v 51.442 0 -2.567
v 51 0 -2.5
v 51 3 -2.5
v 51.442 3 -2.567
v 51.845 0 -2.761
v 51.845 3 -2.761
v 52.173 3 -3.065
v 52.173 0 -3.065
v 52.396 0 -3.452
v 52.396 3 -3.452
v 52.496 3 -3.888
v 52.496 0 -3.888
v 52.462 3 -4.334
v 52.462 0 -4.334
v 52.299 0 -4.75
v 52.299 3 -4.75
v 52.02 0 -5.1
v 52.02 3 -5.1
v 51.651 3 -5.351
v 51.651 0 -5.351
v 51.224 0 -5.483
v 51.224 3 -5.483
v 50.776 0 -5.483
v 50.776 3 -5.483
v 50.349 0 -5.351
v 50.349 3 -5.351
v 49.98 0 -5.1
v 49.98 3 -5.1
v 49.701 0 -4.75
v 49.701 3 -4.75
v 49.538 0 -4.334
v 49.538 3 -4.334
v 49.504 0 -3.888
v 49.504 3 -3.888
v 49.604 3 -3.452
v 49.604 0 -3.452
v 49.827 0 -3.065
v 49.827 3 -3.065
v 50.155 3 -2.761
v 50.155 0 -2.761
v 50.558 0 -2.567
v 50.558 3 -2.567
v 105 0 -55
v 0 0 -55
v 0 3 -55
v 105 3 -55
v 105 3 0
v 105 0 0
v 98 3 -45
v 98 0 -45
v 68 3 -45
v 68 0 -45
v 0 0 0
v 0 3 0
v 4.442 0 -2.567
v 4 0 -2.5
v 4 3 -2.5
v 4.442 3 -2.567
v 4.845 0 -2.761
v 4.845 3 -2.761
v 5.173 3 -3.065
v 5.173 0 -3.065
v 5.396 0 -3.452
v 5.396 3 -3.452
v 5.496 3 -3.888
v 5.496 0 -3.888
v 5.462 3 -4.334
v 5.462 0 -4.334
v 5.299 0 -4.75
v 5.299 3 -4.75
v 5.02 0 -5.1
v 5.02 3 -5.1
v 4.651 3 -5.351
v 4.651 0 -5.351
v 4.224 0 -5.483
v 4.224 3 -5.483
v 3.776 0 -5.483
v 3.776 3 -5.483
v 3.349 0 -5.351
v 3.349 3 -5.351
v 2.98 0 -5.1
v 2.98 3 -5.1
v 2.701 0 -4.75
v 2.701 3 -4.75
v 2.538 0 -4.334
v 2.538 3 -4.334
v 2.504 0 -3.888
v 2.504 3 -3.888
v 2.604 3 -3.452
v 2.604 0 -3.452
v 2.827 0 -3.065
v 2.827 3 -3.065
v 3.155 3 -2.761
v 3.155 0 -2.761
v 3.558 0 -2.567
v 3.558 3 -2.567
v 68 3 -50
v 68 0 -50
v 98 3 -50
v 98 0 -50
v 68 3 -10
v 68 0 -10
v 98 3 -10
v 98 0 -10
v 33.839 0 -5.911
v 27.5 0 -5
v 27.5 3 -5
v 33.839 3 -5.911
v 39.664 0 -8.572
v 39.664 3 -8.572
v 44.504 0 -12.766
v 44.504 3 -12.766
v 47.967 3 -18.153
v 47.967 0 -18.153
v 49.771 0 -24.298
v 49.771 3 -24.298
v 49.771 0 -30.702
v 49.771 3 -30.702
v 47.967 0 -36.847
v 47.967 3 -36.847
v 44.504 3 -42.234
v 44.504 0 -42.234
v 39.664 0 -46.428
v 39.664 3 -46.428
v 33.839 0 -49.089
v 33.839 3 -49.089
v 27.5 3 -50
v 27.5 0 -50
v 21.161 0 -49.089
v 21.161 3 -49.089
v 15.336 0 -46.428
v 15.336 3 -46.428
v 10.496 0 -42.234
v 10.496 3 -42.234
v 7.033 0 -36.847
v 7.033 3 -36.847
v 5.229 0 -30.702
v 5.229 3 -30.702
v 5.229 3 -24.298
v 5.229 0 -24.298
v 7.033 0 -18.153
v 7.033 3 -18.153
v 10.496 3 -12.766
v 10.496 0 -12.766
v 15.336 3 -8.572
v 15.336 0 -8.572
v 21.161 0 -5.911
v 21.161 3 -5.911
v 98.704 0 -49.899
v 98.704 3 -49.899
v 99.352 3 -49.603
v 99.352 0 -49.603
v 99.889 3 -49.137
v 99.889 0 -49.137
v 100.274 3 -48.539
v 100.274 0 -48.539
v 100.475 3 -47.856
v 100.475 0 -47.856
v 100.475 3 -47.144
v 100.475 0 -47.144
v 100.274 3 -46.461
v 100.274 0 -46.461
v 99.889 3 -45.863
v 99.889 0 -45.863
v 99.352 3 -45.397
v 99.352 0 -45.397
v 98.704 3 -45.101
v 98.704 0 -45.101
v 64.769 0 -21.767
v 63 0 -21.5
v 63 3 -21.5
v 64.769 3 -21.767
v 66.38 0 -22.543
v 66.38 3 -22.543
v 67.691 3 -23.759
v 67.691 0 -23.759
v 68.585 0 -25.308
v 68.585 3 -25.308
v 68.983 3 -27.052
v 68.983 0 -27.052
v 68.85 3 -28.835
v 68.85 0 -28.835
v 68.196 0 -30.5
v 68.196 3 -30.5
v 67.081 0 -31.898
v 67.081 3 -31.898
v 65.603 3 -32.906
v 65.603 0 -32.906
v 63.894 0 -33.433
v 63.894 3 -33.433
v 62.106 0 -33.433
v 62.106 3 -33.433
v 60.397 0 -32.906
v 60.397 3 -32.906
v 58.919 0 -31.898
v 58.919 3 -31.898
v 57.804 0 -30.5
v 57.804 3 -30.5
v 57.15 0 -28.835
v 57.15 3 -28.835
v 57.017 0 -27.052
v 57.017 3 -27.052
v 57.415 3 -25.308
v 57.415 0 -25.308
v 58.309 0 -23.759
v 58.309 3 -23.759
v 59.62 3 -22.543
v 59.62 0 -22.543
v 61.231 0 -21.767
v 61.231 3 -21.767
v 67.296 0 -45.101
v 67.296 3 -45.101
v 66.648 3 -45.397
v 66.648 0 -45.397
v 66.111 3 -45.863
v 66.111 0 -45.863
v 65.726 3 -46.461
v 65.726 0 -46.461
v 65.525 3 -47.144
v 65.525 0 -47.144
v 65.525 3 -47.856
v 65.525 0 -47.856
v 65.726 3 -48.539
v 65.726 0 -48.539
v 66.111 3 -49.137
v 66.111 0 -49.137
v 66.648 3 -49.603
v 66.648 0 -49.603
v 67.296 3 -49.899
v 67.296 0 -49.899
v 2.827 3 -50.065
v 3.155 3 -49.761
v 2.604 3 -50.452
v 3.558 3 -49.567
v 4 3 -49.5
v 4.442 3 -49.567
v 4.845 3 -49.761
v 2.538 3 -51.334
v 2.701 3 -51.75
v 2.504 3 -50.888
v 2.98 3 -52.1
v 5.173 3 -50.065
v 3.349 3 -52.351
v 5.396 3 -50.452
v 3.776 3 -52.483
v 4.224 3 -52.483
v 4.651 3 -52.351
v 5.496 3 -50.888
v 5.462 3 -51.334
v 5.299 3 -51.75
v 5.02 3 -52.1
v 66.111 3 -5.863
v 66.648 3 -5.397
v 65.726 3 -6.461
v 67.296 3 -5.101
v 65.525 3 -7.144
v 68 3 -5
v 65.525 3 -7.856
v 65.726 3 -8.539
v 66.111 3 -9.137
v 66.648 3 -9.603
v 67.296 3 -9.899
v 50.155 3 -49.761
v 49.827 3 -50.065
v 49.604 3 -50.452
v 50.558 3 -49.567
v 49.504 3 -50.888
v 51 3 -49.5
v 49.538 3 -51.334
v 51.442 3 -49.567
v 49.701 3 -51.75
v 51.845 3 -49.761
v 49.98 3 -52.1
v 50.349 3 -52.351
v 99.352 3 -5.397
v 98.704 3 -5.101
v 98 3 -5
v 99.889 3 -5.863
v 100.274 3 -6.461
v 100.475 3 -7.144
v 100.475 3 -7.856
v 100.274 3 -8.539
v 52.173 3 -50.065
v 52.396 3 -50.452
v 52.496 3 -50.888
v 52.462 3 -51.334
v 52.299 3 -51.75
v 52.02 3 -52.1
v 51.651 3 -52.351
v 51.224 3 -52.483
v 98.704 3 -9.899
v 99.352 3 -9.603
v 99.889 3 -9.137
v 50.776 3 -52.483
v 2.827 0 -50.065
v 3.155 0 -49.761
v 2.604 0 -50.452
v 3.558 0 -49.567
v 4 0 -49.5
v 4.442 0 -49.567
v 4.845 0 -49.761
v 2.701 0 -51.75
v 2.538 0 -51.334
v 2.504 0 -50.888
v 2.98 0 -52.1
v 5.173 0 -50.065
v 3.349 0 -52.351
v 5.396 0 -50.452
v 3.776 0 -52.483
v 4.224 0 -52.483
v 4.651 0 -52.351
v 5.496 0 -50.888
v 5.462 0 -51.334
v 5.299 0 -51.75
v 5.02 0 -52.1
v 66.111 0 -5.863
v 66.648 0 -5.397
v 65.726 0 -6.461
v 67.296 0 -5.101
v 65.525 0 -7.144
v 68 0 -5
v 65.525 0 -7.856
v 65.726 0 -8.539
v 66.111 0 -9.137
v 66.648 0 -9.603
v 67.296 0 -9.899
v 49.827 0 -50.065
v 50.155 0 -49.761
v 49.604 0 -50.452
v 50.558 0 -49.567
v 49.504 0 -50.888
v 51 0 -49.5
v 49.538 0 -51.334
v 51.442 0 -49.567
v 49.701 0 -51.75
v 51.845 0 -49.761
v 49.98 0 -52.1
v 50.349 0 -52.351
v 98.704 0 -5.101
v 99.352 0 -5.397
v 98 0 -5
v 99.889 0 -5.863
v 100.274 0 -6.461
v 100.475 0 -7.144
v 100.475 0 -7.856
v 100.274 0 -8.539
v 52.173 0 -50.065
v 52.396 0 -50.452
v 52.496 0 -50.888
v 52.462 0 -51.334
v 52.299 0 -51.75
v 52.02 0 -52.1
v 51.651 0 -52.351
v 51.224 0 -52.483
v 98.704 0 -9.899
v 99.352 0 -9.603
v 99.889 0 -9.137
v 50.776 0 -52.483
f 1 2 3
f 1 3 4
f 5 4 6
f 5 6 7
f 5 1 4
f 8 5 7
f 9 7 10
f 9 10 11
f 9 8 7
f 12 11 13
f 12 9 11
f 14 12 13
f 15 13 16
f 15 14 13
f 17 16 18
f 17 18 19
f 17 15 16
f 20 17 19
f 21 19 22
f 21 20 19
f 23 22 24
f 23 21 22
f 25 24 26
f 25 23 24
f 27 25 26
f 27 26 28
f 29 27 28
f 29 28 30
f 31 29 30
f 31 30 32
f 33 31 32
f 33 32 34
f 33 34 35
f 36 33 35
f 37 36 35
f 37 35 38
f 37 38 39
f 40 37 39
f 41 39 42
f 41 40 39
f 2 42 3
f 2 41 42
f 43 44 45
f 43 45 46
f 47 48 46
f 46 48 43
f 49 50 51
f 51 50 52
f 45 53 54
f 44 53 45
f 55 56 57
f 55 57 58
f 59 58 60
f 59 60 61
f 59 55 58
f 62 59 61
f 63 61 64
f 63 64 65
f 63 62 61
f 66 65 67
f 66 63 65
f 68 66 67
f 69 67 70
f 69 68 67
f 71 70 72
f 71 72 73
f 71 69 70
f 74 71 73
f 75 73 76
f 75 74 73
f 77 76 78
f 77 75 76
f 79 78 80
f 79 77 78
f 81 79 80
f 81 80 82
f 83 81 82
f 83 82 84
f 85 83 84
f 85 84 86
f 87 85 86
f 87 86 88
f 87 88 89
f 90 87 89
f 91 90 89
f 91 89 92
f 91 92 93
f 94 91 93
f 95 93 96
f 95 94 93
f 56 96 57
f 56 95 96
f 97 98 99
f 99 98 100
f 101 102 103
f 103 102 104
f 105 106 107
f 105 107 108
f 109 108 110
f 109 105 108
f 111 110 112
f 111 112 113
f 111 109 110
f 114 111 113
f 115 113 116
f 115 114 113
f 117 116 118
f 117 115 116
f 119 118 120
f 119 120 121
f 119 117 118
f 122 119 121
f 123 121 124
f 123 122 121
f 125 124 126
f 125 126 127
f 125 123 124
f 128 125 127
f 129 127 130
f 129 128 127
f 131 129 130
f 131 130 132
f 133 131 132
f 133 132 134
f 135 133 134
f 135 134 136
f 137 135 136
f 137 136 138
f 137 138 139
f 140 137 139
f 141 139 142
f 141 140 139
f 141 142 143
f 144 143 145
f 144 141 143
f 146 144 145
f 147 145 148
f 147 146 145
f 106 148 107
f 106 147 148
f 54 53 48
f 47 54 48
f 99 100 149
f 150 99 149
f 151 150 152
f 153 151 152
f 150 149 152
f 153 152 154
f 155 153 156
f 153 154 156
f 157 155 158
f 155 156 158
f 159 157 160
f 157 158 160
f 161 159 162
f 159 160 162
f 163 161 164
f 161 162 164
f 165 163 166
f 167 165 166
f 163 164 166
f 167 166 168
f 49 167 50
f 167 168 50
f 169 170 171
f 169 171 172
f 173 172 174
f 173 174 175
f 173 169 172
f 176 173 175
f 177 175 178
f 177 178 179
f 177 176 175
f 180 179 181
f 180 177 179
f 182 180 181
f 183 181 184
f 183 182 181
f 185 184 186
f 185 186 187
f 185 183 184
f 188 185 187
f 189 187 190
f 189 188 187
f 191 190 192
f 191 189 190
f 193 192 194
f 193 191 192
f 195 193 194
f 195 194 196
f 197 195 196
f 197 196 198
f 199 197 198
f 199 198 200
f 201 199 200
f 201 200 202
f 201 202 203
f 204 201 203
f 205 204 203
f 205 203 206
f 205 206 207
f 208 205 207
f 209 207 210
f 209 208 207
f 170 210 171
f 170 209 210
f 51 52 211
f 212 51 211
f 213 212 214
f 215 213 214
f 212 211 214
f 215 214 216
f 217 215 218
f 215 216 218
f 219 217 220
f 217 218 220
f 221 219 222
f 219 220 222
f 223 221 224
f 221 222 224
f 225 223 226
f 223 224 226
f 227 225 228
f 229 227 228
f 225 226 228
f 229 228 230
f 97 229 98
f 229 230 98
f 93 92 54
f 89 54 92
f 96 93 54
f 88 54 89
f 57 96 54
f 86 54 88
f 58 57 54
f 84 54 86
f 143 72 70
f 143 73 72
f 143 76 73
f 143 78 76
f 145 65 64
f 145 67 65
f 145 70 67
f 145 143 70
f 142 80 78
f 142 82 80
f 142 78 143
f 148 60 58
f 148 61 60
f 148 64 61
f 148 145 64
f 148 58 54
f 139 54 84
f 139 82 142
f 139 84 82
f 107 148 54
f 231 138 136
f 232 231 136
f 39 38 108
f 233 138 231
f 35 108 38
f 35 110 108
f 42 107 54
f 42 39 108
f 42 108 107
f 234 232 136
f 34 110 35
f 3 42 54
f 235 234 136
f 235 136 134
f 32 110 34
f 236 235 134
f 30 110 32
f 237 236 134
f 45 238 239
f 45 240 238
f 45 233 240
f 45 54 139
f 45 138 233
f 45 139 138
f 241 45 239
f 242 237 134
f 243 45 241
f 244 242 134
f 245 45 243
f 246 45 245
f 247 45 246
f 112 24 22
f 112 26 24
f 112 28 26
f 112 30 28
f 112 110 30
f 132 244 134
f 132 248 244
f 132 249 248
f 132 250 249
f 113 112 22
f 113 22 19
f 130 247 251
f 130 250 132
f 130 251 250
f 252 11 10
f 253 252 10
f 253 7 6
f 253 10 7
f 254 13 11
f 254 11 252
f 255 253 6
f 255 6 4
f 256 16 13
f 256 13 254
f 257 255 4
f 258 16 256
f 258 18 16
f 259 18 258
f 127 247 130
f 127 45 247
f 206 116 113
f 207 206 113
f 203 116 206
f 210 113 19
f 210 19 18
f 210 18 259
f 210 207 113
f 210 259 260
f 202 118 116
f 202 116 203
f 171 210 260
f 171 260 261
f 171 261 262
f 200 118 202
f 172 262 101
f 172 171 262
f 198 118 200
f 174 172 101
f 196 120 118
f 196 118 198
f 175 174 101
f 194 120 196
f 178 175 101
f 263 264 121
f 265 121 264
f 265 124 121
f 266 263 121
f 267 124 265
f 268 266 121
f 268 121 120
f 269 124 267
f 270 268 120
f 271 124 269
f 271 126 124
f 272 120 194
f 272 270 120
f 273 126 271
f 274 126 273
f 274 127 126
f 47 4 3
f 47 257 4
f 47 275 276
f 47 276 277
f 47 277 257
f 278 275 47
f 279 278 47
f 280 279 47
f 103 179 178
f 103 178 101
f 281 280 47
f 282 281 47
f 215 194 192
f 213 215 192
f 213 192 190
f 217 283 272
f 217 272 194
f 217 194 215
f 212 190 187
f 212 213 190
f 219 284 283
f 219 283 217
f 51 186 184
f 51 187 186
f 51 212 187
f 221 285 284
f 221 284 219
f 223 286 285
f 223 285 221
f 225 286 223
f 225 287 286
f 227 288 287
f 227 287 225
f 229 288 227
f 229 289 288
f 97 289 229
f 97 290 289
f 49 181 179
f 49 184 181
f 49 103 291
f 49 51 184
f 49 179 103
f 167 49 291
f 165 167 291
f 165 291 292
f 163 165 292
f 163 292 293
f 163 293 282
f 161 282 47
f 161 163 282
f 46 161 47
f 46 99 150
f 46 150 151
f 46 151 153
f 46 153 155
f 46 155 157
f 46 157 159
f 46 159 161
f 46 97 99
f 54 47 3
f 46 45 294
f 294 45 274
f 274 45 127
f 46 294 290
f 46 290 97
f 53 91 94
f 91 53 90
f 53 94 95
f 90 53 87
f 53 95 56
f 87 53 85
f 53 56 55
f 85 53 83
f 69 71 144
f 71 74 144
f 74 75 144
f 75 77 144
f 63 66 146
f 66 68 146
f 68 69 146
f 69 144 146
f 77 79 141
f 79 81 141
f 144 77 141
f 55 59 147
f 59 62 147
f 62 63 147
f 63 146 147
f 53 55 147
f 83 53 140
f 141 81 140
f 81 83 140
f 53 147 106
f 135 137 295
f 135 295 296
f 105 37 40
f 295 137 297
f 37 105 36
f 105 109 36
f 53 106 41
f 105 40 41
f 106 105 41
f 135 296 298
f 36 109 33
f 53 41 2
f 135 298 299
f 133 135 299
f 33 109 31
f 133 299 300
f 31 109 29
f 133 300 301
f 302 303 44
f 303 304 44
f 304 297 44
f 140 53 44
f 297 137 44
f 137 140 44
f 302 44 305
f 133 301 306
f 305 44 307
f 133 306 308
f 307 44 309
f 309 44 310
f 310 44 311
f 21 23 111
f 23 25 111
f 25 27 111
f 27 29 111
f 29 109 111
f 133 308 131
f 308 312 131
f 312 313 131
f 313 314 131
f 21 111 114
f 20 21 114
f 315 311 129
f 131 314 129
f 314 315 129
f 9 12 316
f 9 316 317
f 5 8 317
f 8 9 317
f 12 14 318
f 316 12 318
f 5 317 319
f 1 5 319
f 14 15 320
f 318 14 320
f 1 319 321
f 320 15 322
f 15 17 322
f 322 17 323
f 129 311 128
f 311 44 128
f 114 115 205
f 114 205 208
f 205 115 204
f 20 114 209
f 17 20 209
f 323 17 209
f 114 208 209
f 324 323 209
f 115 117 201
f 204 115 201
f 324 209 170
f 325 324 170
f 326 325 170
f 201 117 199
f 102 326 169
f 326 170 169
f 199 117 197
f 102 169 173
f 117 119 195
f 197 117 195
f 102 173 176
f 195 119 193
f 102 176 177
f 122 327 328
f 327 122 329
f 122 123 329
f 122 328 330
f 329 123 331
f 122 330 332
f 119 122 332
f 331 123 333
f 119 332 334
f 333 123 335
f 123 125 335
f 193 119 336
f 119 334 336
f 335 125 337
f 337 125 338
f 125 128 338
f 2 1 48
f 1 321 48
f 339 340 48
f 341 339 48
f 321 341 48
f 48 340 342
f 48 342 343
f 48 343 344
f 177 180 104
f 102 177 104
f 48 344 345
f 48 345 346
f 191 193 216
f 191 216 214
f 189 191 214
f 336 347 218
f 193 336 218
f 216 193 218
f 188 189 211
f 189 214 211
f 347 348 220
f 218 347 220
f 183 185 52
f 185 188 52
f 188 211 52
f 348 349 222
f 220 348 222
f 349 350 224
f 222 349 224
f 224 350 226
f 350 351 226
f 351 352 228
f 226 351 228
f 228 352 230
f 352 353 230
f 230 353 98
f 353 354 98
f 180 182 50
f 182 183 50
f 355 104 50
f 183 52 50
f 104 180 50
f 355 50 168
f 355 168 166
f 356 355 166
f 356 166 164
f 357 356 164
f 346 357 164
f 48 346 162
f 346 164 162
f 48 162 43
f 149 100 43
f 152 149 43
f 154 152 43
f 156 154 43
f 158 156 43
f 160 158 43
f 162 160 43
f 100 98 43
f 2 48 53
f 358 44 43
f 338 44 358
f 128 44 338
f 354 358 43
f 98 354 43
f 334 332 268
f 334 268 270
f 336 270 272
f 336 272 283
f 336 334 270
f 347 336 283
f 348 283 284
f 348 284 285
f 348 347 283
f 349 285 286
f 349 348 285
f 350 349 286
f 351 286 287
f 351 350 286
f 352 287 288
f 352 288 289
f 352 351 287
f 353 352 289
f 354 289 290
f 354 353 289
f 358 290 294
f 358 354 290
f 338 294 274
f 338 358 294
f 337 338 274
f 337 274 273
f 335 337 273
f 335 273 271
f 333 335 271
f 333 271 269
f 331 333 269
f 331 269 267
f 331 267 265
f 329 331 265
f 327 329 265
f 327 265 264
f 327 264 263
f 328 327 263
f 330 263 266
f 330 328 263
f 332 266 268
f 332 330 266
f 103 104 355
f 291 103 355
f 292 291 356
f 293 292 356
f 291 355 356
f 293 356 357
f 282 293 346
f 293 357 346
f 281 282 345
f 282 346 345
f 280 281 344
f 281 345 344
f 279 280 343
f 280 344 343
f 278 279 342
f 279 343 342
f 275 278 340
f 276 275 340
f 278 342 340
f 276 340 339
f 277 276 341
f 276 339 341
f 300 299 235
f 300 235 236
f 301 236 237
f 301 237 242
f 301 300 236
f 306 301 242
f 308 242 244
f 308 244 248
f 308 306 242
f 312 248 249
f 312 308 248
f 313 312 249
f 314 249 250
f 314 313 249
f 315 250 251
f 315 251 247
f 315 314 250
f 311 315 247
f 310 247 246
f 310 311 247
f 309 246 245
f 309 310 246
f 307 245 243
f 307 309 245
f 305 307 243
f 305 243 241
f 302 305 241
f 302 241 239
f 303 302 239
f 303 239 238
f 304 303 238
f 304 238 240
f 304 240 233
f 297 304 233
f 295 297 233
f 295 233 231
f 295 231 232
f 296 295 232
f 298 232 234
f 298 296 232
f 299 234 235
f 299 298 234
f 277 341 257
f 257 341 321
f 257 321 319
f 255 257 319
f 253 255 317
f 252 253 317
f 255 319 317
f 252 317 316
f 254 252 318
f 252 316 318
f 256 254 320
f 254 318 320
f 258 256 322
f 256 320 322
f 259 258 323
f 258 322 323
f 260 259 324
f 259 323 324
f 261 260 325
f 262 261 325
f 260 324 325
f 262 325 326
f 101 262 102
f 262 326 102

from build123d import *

# Parameters (mm, degrees)
SKETCH1_W           = 105
SKETCH1_H           = 55
SKETCH1_R           = 22.5
SKETCH1_R_2         = 6
SKETCH1_R_3         = 1.5
BOSS_EXTRUDE1_DEPTH = 3


with BuildPart() as part:
    # Sketch1 → Boss-Extrude1 (new body)
    with BuildSketch(Plane(origin=(0, 0, 0), x_dir=(1, 0, 0), z_dir=(0, 1, 0))):
        with Locations((52.5, 27.5)):
            Rectangle(SKETCH1_W, SKETCH1_H)
        with Locations((27.5, 27.5)):
            Circle(SKETCH1_R, mode=Mode.SUBTRACT)
        with Locations((63, 27.5)):
            Circle(SKETCH1_R_2, mode=Mode.SUBTRACT)
        with Locations((4, 4)):
            Circle(SKETCH1_R_3, mode=Mode.SUBTRACT)
        with Locations((51, 4)):
            Circle(SKETCH1_R_3, mode=Mode.SUBTRACT)
        with Locations((51, 51)):
            Circle(SKETCH1_R_3, mode=Mode.SUBTRACT)
        with Locations((4, 51)):
            Circle(SKETCH1_R_3, mode=Mode.SUBTRACT)
        with BuildLine():
            Line((98, 45), (68, 45))
            ThreePointArc((68, 45), (65.5, 47.5), (68, 50))
            Line((68, 50), (98, 50))
            ThreePointArc((98, 50), (100.5, 47.5), (98, 45))
        make_face(mode=Mode.SUBTRACT)
        with BuildLine():
            Line((98, 5), (68, 5))
            ThreePointArc((68, 5), (65.5, 7.5), (68, 10))
            Line((68, 10), (98, 10))
            ThreePointArc((98, 10), (100.5, 7.5), (98, 5))
        make_face(mode=Mode.SUBTRACT)
    extrude(amount=BOSS_EXTRUDE1_DEPTH)


solid = part.part
